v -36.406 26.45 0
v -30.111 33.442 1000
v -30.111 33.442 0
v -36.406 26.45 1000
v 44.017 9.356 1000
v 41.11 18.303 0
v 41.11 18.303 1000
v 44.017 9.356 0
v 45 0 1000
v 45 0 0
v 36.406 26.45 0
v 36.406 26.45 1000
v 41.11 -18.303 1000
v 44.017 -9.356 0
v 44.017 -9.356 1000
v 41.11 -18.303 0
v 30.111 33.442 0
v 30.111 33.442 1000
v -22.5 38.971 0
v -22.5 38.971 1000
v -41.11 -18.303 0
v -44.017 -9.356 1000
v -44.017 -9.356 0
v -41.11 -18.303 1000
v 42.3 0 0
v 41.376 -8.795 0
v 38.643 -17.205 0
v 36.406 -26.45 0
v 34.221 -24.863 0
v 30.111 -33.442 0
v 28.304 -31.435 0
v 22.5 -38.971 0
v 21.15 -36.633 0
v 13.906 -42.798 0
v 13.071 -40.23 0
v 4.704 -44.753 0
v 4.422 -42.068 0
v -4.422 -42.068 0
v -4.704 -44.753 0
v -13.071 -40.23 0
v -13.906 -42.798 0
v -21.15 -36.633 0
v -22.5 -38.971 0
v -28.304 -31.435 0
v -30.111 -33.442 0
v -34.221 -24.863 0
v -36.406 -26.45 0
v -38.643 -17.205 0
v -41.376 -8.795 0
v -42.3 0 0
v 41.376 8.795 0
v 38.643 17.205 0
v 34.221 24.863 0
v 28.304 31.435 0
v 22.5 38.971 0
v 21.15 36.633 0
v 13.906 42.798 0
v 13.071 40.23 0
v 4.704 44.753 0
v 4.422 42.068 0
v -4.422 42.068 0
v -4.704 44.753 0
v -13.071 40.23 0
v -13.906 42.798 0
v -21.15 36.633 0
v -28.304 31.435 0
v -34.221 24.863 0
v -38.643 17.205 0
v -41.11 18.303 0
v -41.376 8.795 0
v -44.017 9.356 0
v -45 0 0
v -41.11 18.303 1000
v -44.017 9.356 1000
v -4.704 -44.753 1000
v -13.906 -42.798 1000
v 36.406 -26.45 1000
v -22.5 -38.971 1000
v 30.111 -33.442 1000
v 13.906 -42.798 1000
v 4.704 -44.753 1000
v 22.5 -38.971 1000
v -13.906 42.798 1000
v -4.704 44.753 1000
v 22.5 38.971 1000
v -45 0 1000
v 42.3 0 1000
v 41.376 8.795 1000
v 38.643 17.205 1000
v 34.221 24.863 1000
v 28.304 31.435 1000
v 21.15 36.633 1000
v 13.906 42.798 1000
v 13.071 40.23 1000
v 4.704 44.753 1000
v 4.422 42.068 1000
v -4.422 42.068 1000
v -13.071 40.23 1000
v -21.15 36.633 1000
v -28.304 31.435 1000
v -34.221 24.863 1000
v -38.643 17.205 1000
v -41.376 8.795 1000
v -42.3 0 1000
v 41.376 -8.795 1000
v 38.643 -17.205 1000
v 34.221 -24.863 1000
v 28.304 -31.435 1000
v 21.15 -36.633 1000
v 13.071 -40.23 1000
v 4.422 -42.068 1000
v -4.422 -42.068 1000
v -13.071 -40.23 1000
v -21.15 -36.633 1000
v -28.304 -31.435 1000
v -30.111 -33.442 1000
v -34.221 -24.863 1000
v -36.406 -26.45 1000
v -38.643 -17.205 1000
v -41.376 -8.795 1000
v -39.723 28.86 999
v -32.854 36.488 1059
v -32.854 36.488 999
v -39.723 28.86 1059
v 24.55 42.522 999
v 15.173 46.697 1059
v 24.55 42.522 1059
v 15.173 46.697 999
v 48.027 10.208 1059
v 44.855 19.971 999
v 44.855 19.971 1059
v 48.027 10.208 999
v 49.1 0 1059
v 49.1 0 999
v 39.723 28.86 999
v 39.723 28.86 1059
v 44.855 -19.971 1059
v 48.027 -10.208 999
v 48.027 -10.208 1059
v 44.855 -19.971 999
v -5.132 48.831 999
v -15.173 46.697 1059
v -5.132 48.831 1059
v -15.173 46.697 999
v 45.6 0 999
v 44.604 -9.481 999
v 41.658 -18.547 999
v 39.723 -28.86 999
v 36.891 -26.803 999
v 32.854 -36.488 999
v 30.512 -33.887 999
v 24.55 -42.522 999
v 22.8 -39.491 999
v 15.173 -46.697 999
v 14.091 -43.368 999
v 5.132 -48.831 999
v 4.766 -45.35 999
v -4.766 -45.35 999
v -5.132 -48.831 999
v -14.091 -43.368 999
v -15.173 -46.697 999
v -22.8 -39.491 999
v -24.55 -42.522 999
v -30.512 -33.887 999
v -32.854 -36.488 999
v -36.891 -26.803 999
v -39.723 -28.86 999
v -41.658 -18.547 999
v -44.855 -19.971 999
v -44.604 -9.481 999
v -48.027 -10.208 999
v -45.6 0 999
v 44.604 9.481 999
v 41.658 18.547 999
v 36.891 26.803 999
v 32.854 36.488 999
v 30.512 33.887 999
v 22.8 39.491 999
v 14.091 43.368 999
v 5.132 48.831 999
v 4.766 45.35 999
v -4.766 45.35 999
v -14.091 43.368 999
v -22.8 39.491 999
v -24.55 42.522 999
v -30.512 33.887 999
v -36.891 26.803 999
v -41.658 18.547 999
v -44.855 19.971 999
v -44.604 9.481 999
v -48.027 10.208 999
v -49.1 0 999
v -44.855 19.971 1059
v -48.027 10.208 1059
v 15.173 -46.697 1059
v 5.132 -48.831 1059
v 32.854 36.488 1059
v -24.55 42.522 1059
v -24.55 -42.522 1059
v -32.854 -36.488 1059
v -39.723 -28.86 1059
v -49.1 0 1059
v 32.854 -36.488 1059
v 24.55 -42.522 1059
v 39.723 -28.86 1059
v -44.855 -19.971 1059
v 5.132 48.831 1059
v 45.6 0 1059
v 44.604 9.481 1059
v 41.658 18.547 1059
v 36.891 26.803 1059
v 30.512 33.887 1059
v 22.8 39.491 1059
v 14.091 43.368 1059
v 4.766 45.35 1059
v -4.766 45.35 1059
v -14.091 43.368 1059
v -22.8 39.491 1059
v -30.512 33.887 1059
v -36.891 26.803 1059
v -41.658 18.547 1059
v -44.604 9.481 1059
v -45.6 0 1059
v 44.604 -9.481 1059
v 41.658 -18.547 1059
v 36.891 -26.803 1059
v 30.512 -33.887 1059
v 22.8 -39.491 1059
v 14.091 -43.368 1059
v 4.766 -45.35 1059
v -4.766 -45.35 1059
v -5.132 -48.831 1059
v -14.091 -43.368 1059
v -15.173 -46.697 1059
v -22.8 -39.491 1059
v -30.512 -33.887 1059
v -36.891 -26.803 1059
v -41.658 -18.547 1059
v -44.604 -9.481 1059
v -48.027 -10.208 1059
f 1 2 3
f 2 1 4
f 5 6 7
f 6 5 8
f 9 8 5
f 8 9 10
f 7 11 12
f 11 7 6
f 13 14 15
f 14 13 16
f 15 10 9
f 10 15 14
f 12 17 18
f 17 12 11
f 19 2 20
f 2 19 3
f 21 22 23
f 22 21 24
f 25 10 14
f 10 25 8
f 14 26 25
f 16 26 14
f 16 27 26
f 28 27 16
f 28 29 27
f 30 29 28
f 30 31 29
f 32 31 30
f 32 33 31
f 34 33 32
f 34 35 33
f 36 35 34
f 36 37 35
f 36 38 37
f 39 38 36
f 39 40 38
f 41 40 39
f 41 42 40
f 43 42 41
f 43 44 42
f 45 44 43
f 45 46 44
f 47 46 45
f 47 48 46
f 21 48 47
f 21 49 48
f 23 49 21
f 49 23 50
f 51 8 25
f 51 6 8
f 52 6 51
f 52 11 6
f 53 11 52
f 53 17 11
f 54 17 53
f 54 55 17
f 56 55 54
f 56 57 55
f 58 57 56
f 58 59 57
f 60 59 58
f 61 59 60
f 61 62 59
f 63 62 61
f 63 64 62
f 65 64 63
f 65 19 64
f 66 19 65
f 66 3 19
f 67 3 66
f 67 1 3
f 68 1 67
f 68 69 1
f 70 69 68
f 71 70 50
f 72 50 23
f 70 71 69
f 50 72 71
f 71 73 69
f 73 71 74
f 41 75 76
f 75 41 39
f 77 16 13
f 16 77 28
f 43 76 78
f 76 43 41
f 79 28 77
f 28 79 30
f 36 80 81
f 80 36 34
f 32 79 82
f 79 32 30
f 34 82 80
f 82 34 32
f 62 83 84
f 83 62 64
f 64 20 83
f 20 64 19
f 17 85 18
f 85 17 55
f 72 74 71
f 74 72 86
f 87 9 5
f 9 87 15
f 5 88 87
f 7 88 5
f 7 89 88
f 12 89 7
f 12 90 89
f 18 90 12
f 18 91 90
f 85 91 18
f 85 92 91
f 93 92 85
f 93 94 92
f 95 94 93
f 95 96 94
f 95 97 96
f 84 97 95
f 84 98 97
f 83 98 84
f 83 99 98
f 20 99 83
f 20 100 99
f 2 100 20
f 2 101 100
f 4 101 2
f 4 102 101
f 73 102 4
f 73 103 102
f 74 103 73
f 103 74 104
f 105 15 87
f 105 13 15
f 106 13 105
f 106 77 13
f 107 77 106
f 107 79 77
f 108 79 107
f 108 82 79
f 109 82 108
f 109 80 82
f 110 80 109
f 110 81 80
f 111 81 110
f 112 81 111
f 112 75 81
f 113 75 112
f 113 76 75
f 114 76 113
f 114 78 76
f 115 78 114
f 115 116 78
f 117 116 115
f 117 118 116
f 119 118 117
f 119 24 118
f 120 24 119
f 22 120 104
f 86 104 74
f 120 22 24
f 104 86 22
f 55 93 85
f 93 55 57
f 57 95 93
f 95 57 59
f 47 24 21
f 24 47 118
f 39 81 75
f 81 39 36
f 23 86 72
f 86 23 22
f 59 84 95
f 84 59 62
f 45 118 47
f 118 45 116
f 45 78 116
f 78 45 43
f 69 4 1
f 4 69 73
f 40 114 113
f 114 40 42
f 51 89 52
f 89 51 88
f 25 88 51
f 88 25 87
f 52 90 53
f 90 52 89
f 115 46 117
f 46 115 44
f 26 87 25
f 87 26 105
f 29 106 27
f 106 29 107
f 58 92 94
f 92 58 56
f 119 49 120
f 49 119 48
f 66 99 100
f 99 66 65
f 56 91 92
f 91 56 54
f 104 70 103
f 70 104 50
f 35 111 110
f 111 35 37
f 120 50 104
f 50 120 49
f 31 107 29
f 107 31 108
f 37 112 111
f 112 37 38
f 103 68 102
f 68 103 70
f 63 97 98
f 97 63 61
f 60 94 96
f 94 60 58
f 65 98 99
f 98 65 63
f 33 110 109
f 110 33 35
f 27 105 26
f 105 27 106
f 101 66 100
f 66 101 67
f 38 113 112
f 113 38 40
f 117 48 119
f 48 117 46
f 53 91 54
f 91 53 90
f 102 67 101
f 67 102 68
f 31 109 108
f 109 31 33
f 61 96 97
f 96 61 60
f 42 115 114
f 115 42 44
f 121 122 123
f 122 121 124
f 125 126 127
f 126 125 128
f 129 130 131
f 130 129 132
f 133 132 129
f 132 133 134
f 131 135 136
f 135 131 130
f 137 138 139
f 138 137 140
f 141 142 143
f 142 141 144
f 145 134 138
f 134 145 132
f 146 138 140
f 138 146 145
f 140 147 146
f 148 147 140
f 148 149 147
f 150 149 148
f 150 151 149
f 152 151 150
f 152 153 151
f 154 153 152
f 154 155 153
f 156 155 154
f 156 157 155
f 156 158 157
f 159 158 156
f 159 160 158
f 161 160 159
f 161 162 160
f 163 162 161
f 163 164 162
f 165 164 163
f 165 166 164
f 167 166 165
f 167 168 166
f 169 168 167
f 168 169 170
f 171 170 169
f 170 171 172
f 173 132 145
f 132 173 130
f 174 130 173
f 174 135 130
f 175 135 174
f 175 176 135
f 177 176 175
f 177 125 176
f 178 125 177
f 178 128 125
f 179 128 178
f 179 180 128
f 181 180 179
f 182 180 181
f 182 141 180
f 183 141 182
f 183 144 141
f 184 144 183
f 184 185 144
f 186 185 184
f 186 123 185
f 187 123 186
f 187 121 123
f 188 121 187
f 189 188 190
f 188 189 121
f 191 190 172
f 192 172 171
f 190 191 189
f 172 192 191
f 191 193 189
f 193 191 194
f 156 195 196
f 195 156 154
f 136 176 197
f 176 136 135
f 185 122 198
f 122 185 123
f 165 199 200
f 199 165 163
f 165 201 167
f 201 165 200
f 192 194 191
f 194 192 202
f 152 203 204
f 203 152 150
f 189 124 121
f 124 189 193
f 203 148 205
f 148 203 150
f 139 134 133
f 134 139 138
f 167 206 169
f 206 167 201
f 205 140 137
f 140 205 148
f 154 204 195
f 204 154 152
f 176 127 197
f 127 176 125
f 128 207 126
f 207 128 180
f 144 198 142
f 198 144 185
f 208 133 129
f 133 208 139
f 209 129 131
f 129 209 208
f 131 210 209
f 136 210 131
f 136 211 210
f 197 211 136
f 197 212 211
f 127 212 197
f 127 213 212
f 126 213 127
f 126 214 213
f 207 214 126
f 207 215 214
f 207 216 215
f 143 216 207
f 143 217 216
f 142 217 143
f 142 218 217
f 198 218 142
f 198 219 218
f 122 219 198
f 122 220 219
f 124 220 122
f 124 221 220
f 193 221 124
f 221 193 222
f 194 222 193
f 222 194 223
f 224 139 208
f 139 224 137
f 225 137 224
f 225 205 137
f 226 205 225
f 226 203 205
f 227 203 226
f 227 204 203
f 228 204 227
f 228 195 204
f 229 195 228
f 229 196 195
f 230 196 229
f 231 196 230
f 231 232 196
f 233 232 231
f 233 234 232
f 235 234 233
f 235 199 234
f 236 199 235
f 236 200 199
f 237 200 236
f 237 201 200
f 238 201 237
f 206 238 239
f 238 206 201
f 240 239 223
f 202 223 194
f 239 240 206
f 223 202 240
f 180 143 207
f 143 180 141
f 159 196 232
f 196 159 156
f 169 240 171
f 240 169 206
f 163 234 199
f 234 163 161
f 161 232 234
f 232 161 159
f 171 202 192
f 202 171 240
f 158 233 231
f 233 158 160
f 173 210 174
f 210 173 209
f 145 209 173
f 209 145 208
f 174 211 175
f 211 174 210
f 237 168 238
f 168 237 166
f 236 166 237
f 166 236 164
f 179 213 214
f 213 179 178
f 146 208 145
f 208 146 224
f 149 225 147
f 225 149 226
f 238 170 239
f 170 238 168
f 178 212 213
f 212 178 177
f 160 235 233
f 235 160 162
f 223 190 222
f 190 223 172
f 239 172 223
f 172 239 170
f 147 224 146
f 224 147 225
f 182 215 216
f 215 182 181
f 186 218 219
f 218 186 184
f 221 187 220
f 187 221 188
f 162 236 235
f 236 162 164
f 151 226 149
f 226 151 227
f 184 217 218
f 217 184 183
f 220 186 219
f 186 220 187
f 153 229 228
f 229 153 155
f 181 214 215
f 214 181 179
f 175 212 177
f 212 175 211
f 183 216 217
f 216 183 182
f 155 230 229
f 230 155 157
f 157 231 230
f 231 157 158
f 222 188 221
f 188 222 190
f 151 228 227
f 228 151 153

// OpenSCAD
// Parameters
nominal_diameter = 90; //[45:180:1]
length_mm = 1000; //[500:2000:10]
pipe_od = 90; //[45:180:1]
pipe_wall = 2.7; //[1.5:6:0.1]
socket_length = 60; //[30:120:1]
socket_wall = 3.5; //[2:8:0.1]
socket_clearance = 0.6; //[0.2:1.5:0.1]
overlap = 1; //[0.5:2:0.1]

// HT Pipe - complete geometry
module ht_pipe() {
  color([0.85, 0.85, 0.8]) { // PVC color
    union() {
      // Pipe body
      difference() {
        cylinder(h=length_mm, r=pipe_od/2, center=false);
        translate([0, 0, -overlap/2])
          cylinder(h=length_mm + overlap, r=pipe_od/2 - pipe_wall, center=false);
      }
      // End fitting socket
      difference() {
        translate([0, 0, length_mm - overlap])
          cylinder(h=socket_length, r=pipe_od/2 + socket_wall + socket_clearance, center=false);
        translate([0, 0, length_mm - overlap - overlap/2])
          cylinder(h=socket_length + overlap, r=pipe_od/2 + socket_clearance, center=false);
      }
    }
  }
}

// Assembly
module assembly() {
  ht_pipe();
}

assembly();
